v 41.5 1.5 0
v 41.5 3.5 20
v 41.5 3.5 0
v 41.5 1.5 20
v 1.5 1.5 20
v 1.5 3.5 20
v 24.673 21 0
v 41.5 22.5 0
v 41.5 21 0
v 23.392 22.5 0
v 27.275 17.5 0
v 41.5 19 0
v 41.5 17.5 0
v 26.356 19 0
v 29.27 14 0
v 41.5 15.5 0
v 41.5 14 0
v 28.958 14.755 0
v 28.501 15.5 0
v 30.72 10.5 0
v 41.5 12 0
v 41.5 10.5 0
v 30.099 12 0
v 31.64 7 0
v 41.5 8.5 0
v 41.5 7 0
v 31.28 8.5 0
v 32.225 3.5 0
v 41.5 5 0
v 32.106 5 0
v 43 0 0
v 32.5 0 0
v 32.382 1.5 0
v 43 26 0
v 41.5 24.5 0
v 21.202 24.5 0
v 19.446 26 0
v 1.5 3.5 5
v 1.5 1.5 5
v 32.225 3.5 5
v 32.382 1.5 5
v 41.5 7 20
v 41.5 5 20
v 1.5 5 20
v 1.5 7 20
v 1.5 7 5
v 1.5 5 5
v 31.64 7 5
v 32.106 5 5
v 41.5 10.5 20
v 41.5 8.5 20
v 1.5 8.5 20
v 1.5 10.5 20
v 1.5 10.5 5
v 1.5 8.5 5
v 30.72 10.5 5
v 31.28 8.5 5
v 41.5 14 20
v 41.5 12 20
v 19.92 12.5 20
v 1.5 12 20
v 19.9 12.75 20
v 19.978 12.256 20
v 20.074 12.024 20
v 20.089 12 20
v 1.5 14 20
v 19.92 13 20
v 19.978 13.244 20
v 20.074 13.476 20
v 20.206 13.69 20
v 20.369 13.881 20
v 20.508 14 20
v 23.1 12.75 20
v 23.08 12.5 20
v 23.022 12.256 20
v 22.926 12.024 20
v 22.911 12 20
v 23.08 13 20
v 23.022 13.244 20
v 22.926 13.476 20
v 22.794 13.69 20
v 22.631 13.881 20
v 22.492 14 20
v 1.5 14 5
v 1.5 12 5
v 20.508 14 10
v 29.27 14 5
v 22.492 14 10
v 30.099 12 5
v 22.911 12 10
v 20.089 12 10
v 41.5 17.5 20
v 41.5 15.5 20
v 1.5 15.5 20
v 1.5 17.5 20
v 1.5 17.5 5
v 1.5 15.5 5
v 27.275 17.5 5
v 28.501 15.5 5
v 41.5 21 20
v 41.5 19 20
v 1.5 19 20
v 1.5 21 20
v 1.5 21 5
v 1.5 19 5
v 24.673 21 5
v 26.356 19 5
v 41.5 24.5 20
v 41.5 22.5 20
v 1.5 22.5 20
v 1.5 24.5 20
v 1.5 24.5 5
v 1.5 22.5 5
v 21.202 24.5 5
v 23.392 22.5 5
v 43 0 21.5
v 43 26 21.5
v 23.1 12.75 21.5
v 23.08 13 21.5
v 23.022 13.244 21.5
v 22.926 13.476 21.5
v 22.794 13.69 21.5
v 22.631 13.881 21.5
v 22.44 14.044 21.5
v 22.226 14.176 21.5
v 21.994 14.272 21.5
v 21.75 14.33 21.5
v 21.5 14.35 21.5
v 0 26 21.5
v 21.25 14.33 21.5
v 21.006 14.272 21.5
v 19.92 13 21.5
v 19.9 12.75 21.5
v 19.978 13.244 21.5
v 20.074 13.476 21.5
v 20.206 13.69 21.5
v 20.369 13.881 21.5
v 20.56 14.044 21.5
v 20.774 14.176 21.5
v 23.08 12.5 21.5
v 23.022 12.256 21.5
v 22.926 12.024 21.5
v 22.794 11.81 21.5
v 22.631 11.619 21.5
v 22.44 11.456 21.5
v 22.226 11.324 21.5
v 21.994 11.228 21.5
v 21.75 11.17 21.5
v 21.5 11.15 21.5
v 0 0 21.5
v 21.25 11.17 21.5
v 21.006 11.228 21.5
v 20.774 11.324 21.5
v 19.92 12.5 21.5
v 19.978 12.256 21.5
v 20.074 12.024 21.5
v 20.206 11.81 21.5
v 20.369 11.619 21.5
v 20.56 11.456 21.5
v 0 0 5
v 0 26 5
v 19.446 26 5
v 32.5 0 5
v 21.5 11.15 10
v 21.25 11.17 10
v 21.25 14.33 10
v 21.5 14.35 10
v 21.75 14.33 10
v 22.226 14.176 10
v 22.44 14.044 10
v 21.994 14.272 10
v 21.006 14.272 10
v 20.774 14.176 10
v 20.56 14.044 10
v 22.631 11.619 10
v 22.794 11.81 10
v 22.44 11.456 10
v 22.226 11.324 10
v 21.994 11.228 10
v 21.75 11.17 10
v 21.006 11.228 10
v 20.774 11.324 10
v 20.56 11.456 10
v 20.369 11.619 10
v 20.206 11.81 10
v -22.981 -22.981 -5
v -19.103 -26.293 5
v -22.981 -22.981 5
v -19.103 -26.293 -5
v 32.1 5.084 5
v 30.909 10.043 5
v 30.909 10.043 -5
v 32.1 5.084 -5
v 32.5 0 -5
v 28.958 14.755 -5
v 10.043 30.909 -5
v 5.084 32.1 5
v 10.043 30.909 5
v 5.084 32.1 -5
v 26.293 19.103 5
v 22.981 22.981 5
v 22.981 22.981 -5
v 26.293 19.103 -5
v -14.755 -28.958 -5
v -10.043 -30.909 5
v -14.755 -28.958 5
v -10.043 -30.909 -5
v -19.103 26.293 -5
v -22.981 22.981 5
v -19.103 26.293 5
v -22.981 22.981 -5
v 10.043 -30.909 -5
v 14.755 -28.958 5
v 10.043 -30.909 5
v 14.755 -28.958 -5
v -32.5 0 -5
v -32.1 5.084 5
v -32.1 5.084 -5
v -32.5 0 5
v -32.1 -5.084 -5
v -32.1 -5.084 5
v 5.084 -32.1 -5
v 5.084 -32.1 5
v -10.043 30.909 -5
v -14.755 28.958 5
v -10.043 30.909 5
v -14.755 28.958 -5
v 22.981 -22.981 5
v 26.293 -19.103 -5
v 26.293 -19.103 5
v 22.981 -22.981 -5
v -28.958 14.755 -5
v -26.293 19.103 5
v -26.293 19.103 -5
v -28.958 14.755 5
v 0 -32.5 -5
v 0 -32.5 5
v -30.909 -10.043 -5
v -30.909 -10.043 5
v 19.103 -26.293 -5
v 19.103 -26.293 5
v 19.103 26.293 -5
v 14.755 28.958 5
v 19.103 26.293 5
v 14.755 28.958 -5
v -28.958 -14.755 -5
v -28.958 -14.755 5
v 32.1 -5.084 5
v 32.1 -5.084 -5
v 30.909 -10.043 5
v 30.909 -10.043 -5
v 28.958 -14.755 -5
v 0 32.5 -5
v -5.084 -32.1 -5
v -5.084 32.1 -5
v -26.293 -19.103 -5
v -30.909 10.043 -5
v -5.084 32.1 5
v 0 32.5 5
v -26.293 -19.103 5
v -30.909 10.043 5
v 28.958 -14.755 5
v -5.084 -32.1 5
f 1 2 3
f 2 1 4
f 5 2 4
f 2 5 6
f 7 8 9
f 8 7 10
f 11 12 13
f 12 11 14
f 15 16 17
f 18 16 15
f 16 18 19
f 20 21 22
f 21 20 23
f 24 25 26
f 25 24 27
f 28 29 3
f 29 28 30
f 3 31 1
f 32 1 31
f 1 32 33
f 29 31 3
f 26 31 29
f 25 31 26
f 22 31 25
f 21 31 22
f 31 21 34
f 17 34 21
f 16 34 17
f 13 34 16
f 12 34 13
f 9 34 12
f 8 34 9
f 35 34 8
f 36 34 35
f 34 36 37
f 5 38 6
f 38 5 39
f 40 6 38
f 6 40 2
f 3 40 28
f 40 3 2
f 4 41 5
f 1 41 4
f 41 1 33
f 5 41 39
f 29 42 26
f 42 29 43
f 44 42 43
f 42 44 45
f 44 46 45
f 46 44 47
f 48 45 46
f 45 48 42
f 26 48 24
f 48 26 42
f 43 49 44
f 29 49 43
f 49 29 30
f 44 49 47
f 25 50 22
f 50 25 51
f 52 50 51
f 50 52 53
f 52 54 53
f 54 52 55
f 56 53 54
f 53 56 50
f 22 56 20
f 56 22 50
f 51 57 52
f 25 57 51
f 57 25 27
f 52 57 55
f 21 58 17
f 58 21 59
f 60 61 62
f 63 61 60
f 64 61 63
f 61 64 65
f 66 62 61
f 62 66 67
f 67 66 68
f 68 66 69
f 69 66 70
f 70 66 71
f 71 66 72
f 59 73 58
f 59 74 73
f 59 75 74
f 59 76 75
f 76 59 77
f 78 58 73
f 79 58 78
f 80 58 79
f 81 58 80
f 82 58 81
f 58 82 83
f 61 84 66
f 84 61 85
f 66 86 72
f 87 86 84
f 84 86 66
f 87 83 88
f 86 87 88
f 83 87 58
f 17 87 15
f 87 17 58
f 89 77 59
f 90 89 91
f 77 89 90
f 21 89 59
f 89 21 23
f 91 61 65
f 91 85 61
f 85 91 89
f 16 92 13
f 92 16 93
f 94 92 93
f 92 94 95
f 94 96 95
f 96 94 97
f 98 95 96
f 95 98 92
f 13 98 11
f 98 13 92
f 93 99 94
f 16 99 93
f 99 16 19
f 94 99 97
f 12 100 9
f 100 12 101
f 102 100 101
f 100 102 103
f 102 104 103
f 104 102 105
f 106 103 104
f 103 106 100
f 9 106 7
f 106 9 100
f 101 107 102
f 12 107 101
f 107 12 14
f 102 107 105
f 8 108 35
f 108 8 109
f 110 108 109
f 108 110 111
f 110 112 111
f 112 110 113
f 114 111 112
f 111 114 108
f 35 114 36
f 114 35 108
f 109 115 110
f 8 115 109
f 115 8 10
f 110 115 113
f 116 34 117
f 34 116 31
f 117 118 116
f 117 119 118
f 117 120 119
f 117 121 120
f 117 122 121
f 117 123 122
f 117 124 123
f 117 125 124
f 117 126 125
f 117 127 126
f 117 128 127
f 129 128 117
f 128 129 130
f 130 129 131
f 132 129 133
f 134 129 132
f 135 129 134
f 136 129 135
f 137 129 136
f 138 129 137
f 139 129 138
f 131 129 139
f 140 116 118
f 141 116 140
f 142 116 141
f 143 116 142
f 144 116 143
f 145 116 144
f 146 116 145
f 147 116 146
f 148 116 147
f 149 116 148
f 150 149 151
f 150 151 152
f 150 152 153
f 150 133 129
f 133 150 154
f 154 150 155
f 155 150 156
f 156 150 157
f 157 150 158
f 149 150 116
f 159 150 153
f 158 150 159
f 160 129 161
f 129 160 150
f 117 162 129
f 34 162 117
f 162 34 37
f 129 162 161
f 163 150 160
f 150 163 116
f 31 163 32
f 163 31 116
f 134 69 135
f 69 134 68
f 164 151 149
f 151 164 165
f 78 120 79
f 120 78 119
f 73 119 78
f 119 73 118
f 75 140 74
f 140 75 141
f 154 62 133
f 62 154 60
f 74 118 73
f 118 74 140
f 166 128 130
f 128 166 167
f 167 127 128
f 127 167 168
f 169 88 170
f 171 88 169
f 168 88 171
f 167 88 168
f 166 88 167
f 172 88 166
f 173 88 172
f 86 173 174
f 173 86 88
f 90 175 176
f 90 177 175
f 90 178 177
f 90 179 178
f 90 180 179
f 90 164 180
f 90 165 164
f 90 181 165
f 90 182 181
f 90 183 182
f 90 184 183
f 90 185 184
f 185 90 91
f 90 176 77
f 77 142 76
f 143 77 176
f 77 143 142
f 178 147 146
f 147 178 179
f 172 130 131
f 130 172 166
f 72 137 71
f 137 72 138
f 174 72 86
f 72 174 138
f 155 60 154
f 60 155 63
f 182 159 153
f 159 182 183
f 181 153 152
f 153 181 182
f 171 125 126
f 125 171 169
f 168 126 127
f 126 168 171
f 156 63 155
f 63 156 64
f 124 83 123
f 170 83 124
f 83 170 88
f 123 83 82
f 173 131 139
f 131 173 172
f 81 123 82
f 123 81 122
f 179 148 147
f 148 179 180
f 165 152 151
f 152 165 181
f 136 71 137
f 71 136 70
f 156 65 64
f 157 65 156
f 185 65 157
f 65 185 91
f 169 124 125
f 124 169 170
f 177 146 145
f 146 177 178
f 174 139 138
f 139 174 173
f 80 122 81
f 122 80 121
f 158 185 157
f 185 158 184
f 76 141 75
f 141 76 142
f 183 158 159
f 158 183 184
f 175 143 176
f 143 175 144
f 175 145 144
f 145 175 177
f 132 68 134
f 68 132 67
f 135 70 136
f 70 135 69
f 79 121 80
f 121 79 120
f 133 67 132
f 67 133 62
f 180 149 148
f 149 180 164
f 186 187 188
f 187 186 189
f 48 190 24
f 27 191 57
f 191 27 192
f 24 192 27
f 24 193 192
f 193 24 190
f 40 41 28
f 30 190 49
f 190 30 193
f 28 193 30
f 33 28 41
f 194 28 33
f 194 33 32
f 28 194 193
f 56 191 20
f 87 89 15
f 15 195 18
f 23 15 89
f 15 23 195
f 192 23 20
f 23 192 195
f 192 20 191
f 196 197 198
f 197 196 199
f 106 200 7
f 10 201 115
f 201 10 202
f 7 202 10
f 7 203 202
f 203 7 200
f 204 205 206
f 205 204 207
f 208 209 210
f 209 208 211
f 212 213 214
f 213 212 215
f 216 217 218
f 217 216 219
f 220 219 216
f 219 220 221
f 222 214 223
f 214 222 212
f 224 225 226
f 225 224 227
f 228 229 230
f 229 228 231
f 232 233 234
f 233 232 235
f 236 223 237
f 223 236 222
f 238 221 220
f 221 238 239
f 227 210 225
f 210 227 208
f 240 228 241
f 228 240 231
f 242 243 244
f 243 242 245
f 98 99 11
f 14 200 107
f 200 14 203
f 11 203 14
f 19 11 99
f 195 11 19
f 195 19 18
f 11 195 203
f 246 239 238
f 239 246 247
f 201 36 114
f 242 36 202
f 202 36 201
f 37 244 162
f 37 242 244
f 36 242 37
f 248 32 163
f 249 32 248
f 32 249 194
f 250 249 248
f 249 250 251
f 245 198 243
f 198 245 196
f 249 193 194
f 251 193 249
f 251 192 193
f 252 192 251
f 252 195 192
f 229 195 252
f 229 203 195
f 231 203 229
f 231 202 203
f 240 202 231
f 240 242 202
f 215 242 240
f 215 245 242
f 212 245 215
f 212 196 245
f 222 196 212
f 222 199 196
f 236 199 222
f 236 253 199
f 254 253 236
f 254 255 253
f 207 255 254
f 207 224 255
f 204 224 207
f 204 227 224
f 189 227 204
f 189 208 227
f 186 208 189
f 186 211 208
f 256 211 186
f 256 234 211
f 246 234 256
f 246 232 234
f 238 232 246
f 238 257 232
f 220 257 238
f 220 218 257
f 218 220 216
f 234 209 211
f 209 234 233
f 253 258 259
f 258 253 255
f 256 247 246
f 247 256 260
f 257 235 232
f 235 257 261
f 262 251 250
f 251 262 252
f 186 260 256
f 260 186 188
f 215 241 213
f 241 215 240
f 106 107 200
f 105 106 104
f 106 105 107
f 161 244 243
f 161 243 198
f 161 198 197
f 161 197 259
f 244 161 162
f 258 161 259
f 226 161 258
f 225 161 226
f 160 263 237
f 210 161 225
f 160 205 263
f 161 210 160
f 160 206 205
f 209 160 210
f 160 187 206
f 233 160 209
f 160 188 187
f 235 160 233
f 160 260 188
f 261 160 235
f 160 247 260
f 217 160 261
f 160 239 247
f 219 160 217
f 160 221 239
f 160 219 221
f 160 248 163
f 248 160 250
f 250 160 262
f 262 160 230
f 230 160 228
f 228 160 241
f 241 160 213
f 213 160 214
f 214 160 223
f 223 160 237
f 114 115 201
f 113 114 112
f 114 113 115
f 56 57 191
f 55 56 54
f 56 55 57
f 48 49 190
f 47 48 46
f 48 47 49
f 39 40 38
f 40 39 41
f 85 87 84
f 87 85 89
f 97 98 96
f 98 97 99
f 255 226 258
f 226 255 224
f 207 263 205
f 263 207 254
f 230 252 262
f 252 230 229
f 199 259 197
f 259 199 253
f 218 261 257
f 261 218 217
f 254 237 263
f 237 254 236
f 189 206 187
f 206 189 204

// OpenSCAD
//internal_width
$fn = 40;
internal_length = 40;
height = 20;

mold_thickness = 1.5;

layer_num = 6;
layer_width = 2;
spacing = 1.5;

nozzle_orfice = 3.2;

cylinder(h=10,d=65, center=true);



difference(){
    difference(){
       cube([mold_thickness*2+internal_length,((layer_num*(layer_width+spacing))+layer_width+2*mold_thickness),(height+mold_thickness)]);
       
     for (y = [0:layer_num] )
         {translate([mold_thickness,mold_thickness+y*(layer_width+spacing),0])cube([internal_length,layer_width,height]);}
    }
    translate([(mold_thickness*2+internal_length)/2,((layer_num*(layer_width+spacing))+3*mold_thickness)/2,height-10]) //extend a bit into the mold to allow for the nozzle length
            cylinder(h=mold_thickness+10,d=nozzle_orfice);
}

    
